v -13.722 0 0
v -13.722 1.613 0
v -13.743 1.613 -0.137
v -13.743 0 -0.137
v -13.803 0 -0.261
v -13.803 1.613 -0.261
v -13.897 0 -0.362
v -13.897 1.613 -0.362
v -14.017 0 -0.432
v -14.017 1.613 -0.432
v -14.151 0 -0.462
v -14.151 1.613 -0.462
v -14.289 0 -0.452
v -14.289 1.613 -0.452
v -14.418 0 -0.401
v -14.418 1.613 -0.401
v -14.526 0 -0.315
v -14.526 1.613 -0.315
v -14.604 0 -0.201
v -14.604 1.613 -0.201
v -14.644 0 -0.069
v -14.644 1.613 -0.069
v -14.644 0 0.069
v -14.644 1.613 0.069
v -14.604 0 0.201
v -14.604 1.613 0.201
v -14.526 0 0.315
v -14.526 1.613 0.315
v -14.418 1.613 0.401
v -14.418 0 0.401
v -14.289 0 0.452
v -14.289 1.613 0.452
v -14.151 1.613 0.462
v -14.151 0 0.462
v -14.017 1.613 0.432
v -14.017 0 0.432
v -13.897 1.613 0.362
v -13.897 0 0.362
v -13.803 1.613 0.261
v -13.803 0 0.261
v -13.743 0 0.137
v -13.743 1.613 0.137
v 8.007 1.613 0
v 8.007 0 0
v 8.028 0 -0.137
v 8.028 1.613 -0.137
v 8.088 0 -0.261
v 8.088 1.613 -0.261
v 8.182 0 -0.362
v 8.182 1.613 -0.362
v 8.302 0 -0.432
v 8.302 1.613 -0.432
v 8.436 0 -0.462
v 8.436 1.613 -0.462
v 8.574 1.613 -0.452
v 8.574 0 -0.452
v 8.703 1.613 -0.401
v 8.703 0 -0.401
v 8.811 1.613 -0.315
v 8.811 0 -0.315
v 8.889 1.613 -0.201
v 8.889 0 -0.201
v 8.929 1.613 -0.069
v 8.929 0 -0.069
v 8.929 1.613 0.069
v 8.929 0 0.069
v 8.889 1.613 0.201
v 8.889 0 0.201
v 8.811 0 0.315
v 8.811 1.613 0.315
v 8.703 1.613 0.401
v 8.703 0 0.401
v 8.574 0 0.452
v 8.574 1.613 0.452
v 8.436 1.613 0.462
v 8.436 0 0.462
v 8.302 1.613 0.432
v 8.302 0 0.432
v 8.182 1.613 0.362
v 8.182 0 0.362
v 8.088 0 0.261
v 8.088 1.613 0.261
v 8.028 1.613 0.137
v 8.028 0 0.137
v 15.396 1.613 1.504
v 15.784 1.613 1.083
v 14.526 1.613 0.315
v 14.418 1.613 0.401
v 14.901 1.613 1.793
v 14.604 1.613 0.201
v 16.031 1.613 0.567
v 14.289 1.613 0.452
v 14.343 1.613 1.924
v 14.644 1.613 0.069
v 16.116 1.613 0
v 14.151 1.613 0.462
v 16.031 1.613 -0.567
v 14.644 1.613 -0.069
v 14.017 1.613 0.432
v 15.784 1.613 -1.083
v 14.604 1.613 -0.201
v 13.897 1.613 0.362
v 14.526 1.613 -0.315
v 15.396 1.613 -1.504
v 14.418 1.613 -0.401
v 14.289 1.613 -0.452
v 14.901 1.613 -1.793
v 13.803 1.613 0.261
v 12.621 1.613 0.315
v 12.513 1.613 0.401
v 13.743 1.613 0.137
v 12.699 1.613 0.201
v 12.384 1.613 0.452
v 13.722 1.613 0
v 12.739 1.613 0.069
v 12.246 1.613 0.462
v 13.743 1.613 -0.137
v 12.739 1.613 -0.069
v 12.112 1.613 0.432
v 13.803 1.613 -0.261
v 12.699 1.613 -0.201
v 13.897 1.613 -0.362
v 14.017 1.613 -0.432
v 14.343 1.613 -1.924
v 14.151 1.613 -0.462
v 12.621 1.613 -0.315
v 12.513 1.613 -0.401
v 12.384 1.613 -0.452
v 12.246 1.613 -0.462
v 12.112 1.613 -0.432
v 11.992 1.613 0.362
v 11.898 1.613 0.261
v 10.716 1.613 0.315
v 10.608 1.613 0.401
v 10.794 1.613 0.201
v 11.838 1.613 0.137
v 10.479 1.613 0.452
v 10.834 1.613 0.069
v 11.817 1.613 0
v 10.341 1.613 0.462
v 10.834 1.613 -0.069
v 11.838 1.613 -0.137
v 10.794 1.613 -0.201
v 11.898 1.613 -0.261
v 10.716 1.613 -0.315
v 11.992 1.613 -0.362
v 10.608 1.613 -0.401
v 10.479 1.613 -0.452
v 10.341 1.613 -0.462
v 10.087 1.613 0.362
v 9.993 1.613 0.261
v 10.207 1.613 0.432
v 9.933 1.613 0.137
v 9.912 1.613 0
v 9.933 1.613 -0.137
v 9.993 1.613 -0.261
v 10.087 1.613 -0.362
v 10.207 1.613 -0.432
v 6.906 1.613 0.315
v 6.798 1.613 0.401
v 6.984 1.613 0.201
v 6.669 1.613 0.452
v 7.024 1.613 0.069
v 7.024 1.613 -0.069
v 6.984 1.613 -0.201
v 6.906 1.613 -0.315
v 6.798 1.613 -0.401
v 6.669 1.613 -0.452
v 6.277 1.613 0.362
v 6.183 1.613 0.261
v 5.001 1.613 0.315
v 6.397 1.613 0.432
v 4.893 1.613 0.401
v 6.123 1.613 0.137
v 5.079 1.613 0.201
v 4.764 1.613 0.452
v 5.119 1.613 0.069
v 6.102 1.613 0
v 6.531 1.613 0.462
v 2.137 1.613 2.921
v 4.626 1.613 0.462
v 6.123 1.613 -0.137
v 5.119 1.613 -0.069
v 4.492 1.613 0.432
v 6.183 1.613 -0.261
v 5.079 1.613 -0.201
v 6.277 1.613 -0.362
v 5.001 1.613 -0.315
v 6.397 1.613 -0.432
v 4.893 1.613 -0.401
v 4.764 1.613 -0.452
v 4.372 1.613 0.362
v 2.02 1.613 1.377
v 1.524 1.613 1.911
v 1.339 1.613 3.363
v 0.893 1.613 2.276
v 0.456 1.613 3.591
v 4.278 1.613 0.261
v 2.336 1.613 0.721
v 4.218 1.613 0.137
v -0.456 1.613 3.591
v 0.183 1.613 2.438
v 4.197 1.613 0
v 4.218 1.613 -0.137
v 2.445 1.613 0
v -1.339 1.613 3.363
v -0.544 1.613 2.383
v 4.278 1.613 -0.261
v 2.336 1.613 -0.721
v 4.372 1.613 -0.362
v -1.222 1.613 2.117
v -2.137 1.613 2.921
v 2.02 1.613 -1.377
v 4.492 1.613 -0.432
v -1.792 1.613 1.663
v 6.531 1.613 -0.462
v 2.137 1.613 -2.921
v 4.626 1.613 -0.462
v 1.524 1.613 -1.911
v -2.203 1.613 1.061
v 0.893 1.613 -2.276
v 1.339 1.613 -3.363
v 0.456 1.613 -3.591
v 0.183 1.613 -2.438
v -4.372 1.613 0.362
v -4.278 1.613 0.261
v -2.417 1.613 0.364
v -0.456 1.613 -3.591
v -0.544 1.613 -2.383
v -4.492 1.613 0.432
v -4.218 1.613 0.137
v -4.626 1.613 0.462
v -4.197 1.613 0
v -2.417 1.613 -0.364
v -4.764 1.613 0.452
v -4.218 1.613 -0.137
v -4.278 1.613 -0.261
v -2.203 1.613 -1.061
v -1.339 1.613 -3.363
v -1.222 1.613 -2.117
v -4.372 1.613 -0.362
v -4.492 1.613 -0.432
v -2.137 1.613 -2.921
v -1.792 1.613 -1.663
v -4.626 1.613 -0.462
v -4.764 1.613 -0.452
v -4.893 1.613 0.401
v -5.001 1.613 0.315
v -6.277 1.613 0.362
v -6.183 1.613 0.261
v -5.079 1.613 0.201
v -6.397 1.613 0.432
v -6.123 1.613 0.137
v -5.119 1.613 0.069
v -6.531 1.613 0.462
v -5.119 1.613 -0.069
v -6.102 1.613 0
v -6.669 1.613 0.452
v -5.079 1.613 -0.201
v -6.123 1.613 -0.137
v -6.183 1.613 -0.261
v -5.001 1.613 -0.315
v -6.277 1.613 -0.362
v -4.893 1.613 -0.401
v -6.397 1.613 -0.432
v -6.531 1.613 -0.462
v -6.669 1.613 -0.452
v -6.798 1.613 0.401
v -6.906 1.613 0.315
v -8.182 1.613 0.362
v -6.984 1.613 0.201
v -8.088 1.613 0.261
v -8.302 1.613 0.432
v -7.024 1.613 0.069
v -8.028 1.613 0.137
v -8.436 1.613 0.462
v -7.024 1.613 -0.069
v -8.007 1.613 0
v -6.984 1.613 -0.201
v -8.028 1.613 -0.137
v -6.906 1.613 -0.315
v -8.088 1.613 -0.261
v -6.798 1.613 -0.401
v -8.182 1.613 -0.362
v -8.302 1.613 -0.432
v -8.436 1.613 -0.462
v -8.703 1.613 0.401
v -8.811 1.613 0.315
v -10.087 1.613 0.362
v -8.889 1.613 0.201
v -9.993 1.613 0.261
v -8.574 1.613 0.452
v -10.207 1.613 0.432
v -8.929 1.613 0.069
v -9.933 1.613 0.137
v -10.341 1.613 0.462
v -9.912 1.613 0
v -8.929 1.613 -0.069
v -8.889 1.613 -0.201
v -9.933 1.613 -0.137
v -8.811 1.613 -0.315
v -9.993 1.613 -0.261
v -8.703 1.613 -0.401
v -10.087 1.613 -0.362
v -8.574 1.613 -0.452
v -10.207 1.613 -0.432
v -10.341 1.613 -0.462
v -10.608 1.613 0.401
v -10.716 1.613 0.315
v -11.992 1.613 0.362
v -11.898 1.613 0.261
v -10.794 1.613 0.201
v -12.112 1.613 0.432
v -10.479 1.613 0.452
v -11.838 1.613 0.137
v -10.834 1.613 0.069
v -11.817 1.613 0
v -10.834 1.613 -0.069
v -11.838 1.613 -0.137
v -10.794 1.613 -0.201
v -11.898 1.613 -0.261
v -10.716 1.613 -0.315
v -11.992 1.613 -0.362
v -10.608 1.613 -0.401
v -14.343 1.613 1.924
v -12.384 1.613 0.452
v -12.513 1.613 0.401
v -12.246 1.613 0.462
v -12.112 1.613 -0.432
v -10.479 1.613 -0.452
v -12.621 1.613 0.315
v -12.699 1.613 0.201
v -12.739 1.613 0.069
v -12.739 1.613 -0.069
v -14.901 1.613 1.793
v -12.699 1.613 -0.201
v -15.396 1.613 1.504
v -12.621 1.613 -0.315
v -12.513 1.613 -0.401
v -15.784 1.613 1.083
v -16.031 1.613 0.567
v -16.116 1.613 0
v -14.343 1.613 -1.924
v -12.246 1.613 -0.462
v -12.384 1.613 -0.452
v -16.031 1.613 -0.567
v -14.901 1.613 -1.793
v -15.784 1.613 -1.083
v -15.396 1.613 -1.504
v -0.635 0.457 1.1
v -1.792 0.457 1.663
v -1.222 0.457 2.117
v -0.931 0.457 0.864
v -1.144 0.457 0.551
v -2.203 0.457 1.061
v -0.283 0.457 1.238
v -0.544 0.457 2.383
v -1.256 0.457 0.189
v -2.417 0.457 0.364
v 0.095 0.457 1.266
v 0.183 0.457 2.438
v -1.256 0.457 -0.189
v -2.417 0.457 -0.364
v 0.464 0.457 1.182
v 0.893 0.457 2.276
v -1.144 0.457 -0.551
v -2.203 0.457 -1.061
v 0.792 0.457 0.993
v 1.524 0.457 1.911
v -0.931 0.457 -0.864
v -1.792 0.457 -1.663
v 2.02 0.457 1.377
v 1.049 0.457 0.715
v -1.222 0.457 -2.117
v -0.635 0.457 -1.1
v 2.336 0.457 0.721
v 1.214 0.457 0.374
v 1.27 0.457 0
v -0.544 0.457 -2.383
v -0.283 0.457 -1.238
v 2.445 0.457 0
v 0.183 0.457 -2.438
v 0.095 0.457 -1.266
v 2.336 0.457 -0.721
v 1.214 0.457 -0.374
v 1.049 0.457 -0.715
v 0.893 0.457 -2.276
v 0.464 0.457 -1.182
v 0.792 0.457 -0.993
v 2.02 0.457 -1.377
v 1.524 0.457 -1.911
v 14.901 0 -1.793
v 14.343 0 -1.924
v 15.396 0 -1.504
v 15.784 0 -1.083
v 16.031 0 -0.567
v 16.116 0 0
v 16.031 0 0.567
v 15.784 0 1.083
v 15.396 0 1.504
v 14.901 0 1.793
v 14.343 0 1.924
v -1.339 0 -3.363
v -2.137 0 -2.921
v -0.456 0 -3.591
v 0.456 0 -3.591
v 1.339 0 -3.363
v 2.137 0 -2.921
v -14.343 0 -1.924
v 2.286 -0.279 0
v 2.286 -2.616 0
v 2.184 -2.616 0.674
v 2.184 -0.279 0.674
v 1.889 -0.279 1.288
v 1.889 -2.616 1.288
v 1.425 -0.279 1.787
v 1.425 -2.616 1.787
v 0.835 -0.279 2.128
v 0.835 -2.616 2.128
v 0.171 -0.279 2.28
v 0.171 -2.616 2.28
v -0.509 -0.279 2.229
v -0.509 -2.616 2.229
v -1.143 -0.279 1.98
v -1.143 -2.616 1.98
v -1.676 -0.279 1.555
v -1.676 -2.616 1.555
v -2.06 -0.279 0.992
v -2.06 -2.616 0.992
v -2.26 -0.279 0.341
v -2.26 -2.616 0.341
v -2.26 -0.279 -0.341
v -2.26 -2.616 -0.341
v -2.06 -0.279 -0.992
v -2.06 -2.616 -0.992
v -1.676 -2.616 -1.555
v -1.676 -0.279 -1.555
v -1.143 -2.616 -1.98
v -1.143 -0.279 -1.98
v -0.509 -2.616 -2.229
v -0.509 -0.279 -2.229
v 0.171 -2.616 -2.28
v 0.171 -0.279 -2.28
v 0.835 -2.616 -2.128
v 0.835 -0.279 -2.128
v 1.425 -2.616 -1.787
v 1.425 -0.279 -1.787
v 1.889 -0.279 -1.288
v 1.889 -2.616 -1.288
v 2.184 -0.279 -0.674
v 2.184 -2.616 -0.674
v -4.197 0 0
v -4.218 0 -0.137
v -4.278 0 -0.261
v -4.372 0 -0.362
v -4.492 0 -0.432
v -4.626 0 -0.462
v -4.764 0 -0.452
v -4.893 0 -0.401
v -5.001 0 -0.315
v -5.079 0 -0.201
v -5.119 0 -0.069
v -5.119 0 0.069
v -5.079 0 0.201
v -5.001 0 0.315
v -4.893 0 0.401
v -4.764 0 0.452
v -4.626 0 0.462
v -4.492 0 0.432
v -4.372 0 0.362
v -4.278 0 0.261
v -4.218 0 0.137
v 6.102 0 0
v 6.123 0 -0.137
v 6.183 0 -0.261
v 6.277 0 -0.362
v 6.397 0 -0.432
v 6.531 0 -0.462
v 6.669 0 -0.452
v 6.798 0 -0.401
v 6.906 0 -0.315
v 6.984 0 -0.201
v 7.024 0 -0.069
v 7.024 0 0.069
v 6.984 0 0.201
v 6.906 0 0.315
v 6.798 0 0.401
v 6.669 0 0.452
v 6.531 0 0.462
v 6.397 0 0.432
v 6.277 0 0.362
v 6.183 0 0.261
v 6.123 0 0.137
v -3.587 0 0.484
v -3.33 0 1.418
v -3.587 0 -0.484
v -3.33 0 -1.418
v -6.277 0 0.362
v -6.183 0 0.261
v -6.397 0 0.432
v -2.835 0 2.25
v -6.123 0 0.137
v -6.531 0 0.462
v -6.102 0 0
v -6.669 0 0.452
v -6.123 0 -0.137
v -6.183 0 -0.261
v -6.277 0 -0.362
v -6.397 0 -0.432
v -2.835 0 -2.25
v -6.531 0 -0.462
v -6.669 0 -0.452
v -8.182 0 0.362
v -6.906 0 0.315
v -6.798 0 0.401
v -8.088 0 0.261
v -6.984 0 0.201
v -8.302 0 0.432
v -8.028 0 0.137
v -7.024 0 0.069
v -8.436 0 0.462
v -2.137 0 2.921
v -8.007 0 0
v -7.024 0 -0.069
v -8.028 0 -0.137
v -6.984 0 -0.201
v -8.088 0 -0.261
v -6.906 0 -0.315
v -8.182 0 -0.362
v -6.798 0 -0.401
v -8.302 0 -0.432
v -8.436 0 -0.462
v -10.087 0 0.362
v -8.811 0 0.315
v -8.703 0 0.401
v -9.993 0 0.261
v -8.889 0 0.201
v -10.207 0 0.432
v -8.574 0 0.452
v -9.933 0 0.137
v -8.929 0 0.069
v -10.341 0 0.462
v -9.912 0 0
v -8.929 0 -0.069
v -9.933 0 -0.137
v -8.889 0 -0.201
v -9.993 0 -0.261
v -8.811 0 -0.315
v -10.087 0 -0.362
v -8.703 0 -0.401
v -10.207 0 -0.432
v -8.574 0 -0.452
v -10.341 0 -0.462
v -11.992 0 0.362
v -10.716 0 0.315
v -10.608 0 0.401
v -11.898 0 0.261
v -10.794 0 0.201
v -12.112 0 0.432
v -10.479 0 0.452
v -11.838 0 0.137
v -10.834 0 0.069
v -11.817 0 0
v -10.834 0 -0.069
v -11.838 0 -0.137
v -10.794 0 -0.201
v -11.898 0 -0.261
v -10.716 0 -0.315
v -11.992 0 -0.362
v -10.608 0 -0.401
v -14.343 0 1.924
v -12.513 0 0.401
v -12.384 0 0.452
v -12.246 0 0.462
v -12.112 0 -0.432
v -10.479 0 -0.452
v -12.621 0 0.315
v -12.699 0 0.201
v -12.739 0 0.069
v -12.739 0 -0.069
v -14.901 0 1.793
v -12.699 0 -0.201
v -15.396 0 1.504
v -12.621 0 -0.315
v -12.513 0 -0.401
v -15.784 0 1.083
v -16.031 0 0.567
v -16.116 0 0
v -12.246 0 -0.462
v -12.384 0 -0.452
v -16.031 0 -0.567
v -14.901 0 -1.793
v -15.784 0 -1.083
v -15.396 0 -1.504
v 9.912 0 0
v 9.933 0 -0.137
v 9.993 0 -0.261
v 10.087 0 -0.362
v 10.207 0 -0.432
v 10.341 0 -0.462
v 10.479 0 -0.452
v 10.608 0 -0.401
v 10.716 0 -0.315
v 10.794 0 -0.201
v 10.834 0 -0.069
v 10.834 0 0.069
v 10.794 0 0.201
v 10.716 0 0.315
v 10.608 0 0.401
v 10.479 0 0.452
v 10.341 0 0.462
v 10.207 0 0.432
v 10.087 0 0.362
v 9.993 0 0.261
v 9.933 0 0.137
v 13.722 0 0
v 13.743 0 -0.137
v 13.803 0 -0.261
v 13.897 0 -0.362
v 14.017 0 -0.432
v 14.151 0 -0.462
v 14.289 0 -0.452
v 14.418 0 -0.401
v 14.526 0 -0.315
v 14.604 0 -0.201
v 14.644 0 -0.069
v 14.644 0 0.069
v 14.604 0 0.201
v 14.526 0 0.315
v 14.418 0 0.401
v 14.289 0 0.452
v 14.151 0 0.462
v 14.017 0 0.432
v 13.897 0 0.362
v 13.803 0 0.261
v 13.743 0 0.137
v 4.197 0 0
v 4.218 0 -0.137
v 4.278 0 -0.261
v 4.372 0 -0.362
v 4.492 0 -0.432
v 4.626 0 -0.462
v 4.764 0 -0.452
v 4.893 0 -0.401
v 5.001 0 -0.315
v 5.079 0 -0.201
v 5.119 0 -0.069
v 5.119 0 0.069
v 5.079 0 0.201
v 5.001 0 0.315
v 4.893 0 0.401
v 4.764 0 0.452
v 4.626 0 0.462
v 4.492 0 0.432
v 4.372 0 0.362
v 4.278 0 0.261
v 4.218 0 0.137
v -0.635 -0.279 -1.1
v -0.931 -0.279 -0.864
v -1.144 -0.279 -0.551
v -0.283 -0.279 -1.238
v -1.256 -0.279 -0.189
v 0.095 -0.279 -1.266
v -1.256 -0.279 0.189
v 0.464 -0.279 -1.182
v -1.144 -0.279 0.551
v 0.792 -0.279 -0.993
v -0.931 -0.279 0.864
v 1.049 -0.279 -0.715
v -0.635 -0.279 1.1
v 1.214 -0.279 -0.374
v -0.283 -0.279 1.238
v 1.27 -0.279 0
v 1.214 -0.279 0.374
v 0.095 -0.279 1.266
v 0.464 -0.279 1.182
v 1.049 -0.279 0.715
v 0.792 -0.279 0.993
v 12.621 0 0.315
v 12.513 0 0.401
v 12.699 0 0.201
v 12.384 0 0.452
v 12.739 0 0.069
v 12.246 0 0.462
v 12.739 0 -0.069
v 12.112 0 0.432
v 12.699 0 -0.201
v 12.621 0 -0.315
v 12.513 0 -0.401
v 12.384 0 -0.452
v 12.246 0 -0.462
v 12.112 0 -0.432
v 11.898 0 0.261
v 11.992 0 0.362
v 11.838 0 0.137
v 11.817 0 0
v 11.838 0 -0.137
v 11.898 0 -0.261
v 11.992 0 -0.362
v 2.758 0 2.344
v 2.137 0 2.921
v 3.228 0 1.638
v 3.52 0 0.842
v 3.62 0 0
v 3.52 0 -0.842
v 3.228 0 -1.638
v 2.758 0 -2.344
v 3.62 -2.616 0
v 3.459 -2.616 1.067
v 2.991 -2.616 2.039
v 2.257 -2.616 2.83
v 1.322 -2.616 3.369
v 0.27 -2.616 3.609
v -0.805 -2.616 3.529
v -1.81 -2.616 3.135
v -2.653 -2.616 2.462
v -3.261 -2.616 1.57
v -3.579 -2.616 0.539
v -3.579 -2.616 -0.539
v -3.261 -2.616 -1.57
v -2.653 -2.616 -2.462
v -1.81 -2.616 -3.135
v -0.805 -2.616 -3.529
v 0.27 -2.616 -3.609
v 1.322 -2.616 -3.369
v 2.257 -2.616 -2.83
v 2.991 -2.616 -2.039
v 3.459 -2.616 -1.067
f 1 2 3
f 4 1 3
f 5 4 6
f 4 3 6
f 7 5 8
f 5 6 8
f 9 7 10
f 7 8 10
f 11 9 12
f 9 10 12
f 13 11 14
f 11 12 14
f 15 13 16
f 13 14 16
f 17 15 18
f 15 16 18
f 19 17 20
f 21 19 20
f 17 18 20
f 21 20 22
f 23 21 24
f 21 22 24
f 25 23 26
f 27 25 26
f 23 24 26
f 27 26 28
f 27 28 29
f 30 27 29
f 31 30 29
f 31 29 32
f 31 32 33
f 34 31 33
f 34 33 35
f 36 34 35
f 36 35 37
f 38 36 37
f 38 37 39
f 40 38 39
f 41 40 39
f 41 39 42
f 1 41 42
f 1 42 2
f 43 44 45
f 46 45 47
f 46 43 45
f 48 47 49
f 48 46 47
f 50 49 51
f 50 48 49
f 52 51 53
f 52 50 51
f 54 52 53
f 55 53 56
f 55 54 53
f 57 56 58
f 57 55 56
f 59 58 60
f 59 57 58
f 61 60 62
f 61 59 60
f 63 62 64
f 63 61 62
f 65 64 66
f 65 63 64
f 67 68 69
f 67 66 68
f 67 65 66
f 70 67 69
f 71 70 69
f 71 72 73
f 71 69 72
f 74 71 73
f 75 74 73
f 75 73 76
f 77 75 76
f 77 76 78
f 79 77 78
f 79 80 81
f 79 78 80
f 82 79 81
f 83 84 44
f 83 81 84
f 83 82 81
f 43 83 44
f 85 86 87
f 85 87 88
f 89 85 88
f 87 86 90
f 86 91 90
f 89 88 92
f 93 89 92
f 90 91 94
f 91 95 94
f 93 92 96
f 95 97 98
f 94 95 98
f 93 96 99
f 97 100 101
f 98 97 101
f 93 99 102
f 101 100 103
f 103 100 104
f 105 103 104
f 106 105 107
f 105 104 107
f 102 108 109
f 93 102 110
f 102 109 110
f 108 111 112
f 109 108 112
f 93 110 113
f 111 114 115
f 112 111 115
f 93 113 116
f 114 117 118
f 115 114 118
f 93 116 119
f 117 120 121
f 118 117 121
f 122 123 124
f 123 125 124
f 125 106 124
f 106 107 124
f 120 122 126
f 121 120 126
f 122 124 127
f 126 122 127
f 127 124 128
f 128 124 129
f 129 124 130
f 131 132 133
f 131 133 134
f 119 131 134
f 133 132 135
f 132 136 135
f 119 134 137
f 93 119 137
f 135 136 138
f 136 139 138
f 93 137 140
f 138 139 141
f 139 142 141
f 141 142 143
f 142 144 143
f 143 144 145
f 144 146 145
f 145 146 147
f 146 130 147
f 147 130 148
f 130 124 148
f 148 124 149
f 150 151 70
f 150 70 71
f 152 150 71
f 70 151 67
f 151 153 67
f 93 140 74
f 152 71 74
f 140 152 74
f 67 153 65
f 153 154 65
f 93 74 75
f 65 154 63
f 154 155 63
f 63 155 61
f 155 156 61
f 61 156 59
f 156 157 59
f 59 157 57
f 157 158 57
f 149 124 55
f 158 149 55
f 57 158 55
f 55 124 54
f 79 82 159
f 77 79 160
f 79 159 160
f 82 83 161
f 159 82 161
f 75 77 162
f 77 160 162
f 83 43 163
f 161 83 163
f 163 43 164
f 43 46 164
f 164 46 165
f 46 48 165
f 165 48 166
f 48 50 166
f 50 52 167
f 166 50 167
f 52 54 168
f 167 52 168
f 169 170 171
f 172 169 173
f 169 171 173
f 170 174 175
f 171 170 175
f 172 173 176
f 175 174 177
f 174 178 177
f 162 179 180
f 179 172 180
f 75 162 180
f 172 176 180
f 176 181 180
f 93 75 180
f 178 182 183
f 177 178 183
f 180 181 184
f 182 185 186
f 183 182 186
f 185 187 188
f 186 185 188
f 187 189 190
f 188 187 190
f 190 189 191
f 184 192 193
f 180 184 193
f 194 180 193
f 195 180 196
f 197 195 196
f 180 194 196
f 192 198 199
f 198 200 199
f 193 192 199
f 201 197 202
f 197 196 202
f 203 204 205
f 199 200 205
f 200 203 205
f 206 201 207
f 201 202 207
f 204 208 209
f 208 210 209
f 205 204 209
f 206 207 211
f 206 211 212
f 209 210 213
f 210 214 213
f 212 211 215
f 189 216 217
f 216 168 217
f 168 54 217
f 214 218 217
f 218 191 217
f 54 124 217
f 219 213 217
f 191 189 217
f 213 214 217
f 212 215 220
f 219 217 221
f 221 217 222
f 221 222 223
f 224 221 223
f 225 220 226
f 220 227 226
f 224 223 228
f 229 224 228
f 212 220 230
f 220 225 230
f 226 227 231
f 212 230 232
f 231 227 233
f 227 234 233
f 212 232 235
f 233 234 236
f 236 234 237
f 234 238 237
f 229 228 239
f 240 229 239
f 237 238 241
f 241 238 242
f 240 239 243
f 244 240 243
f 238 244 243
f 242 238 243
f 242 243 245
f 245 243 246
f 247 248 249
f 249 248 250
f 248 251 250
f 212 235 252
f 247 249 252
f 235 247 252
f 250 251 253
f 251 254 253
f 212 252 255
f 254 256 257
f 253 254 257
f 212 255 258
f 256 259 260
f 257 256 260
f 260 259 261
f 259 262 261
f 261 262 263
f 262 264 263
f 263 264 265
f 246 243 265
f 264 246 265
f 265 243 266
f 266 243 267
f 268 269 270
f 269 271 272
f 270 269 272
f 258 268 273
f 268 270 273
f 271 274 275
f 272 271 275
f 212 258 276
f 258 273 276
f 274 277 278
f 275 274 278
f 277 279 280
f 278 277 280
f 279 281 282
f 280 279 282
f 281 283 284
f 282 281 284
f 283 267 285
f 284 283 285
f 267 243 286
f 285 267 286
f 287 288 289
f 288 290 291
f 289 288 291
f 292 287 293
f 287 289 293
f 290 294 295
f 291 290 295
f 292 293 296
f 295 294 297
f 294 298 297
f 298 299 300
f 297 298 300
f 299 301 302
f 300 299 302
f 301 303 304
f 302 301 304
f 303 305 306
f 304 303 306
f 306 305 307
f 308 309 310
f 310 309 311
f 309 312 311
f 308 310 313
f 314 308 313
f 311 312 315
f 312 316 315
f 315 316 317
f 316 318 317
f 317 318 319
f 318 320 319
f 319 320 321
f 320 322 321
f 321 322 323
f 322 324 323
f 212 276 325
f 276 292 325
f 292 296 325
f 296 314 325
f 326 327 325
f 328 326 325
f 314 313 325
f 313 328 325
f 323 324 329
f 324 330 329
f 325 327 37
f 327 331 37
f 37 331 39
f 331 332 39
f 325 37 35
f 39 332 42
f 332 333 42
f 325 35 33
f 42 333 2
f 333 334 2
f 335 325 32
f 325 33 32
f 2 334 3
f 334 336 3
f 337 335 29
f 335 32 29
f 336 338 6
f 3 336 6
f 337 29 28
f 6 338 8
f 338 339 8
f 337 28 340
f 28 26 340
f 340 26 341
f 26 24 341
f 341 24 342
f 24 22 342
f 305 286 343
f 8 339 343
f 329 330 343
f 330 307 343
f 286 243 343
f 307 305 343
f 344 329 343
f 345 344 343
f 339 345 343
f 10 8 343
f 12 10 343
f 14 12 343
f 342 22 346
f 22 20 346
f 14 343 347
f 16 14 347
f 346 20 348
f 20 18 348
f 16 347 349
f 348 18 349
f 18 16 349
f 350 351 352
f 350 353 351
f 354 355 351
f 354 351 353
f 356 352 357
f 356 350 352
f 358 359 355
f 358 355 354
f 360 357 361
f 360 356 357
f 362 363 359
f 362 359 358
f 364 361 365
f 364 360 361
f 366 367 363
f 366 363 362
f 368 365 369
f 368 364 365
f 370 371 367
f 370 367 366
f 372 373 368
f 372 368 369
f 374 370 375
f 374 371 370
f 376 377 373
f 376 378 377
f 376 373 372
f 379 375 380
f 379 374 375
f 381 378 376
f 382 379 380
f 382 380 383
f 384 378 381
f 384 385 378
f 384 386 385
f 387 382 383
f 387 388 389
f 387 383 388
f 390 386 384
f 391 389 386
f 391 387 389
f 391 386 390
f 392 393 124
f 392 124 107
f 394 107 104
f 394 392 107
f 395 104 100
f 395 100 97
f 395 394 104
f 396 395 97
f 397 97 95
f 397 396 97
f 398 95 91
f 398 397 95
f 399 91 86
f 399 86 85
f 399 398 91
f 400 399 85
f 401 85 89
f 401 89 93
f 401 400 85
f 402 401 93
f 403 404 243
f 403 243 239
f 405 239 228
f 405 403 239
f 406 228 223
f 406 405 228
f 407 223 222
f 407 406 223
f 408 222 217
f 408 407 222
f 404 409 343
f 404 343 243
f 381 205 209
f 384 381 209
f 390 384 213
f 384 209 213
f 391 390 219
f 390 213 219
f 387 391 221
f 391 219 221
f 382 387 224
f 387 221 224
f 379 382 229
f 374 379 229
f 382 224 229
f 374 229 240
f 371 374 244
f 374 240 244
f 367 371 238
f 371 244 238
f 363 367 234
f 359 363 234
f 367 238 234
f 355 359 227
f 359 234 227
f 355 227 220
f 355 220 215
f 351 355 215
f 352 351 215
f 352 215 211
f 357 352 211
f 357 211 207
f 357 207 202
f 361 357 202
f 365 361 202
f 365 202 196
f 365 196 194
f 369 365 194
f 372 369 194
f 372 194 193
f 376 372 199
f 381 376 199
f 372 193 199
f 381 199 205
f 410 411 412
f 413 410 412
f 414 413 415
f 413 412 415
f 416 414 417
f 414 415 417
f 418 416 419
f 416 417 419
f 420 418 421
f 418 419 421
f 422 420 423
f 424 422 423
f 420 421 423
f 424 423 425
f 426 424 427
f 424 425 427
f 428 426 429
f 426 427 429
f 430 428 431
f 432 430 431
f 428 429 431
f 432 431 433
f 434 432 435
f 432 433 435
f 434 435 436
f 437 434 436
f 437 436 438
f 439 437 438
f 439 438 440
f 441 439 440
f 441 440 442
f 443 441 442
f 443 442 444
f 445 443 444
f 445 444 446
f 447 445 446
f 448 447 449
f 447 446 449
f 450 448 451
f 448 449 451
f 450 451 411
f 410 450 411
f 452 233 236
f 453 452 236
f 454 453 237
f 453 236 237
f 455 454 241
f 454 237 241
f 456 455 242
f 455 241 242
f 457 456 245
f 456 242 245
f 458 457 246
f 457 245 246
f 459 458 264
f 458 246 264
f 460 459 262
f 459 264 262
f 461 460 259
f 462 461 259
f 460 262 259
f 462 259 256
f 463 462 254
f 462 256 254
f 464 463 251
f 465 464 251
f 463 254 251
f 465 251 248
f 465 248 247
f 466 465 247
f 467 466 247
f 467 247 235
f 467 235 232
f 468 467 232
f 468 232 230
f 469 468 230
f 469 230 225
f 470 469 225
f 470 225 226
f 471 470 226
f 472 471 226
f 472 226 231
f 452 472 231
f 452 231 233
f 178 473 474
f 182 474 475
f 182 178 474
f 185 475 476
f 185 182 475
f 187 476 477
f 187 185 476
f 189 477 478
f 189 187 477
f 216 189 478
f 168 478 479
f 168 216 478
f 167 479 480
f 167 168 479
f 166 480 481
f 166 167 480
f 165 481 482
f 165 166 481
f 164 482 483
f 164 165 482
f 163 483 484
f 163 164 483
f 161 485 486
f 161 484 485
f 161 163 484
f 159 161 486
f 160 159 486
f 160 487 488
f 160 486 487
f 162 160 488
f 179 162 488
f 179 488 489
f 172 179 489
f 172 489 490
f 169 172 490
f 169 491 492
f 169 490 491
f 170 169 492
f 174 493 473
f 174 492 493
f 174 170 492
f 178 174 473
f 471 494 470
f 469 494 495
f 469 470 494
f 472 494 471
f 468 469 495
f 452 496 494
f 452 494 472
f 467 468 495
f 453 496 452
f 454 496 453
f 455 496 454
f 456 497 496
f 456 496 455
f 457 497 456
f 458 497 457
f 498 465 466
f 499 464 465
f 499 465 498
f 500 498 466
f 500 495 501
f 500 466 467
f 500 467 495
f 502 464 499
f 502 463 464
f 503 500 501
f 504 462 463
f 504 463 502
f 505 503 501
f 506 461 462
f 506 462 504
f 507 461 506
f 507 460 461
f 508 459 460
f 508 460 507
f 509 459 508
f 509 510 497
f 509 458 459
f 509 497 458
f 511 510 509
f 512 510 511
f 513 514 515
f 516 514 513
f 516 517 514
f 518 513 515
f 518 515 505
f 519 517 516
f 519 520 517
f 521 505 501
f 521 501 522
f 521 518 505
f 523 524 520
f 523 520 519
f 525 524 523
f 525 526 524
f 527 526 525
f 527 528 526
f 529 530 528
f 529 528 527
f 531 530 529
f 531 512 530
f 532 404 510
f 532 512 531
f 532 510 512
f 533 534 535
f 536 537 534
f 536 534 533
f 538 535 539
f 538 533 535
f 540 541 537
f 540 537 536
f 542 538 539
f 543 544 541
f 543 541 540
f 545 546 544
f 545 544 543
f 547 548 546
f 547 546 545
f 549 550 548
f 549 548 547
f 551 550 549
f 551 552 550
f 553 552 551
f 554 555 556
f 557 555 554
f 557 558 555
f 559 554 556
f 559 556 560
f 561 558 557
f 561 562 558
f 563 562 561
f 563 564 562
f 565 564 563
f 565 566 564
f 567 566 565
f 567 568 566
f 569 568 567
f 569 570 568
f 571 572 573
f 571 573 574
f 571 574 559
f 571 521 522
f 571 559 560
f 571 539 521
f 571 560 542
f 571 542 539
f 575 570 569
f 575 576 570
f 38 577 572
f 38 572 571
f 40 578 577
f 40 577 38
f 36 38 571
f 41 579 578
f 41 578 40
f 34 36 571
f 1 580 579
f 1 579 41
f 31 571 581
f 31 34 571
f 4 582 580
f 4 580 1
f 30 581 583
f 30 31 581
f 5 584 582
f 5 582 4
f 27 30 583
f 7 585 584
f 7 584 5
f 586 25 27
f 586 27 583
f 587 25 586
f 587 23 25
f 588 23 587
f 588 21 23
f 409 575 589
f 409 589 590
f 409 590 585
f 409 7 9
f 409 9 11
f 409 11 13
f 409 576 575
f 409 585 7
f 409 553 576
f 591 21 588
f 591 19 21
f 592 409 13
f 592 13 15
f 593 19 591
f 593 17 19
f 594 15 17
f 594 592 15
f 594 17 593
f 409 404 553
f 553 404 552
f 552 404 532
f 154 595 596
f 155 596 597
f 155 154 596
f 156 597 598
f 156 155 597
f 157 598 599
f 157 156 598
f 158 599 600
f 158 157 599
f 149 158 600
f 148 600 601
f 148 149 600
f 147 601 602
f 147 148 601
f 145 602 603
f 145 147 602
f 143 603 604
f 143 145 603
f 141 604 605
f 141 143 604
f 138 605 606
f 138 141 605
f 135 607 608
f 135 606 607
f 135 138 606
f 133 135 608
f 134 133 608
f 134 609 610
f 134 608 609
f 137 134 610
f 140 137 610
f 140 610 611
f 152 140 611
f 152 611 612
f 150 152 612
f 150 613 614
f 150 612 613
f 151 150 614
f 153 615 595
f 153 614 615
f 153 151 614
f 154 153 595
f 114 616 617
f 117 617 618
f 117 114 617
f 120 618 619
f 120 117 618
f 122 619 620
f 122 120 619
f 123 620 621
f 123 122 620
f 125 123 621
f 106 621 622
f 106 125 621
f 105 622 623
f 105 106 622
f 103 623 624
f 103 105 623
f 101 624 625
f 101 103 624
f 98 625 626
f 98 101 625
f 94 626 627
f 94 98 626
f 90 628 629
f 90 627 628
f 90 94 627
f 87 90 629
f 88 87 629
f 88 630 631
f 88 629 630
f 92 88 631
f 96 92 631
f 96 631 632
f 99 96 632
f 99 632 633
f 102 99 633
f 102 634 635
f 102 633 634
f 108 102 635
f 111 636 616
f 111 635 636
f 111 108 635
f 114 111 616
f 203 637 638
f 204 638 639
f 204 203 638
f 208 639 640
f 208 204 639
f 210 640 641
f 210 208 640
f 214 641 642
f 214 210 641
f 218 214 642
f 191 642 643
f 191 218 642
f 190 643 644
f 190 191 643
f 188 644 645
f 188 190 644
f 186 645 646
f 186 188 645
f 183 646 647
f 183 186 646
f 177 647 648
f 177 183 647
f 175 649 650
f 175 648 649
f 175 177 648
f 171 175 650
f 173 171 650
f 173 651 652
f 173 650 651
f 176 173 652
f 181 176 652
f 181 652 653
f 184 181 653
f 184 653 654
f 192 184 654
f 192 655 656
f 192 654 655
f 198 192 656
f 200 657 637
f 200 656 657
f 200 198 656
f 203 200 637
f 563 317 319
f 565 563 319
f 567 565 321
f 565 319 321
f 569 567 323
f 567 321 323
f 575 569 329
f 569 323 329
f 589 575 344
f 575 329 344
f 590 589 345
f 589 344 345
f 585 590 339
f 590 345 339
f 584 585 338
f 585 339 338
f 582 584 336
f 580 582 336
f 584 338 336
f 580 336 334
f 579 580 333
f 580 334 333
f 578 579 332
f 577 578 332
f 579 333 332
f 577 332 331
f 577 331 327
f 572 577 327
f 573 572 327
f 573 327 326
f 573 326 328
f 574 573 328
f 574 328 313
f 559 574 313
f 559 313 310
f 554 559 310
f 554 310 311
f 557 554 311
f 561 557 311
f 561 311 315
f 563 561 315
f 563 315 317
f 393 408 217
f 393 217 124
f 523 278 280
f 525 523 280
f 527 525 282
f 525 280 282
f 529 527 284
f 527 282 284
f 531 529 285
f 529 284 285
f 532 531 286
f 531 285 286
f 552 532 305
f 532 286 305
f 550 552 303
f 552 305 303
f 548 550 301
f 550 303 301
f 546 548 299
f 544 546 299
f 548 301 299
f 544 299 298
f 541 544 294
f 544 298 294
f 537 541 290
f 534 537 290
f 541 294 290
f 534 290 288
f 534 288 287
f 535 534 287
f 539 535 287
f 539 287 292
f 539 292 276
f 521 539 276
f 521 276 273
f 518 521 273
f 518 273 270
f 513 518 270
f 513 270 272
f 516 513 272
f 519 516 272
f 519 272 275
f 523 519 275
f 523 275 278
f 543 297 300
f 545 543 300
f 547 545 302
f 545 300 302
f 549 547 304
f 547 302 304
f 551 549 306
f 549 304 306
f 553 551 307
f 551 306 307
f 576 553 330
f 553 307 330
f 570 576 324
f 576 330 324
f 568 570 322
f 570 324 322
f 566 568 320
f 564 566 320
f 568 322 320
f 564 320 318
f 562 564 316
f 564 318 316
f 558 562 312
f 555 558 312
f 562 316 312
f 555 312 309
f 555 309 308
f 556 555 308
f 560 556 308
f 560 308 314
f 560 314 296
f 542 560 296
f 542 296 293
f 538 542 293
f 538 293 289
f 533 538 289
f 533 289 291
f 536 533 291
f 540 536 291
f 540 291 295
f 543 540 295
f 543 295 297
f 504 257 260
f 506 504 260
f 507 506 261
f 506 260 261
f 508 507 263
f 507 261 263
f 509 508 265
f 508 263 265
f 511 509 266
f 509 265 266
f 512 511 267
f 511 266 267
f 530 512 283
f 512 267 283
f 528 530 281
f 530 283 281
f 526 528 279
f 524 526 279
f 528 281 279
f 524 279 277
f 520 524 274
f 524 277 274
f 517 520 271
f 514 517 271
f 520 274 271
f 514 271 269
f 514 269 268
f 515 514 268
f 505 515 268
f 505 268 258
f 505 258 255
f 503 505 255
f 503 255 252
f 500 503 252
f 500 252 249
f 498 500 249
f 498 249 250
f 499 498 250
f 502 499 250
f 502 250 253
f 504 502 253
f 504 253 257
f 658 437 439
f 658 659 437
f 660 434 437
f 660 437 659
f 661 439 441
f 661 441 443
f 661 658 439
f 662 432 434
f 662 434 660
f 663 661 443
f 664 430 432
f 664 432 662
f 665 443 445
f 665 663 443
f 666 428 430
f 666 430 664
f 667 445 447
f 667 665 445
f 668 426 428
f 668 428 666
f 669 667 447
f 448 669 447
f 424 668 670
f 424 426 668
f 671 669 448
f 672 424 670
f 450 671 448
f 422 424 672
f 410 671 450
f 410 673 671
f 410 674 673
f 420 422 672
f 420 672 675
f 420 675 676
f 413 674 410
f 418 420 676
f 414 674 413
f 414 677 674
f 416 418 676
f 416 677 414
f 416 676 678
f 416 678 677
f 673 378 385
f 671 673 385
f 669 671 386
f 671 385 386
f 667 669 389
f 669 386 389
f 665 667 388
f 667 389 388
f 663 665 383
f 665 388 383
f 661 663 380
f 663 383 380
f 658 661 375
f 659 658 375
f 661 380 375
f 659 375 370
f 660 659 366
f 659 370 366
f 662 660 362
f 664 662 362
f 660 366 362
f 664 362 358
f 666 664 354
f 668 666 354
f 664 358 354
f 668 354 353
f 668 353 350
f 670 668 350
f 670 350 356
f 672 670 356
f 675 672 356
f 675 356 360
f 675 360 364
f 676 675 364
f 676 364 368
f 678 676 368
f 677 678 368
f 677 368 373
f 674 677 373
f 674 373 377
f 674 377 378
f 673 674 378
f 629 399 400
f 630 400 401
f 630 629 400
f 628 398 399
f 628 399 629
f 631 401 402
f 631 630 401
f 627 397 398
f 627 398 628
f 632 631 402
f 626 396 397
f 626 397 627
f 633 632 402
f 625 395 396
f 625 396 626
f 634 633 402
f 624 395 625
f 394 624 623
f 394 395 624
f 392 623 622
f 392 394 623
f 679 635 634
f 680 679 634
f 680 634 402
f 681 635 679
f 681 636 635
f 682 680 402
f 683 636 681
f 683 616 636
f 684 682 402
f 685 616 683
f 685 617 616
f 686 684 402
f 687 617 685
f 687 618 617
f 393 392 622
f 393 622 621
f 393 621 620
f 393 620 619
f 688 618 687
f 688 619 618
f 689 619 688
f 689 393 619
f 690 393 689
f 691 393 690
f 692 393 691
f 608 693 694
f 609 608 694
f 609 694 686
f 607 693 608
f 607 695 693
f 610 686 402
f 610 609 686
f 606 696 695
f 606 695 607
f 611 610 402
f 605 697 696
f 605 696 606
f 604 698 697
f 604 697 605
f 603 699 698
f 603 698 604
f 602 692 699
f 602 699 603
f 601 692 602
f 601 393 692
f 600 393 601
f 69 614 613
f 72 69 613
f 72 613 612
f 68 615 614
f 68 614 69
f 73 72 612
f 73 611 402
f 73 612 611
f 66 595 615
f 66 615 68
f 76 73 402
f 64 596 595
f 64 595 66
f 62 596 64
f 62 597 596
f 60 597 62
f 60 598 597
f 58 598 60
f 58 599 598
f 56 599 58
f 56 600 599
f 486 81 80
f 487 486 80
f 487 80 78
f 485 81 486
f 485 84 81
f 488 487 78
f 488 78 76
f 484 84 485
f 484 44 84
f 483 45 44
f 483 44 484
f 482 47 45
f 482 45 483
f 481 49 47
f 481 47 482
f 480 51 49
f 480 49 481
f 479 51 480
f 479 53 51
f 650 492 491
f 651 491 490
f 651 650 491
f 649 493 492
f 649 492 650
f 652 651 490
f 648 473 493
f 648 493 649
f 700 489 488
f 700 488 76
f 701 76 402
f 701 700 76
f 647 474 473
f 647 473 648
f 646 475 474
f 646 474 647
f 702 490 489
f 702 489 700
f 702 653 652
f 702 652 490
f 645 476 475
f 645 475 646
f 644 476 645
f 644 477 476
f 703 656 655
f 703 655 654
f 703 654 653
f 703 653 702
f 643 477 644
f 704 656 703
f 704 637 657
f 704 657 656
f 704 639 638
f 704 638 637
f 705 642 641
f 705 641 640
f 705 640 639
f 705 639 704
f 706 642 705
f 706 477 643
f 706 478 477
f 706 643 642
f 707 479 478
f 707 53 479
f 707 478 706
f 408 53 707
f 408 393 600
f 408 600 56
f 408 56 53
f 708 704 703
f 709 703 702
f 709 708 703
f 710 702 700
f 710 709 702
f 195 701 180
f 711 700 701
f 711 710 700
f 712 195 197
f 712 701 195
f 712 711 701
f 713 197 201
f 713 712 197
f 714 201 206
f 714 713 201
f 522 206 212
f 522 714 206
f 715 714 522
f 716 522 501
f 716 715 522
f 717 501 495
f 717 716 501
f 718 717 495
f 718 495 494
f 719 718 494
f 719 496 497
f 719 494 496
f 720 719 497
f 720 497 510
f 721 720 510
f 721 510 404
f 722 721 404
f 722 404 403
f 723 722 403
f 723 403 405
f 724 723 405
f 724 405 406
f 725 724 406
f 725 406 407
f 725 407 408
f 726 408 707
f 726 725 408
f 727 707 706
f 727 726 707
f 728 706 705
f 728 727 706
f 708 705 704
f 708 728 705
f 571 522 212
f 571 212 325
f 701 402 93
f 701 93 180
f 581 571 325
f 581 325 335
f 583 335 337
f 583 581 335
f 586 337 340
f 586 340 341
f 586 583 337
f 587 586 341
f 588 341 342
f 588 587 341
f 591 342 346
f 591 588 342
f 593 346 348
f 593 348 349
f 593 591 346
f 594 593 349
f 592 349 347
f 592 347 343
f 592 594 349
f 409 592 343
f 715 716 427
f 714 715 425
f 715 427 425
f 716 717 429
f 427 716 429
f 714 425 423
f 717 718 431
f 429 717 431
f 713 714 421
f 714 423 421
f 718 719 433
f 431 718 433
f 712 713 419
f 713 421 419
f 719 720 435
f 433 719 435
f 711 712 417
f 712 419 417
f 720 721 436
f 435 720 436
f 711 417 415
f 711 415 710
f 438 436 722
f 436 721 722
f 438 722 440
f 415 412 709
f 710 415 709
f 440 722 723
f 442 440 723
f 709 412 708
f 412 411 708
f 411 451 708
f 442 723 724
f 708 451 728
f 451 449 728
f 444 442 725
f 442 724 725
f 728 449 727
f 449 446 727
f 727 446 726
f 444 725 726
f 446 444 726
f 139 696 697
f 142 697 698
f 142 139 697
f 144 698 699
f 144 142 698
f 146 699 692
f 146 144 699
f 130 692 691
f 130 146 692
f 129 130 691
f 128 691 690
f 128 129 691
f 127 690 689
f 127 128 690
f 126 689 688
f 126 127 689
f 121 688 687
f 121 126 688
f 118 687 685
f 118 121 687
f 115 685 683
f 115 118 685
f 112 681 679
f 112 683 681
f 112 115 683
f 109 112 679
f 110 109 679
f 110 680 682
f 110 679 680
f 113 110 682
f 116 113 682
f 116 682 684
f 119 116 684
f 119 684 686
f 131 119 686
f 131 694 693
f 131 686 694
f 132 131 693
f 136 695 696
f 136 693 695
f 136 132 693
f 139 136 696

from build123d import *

# Parameters (mm, degrees)
EXTRUDE17_DEPTH = 1.6129
SKETCH19_R      = 3.6195
EXTRUDE19_DEPTH = 4.2291
SKETCH20_R      = 0.46355
SKETCH20_R_2    = 1.27
EXTRUDE20_DEPTH = 5.2291
SKETCH21_R      = 2.44475
EXTRUDE21_DEPTH = 1.1557
SKETCH22_R      = 2.286
EXTRUDE22_DEPTH = 2.3368


with BuildPart() as part:
    # Sketch18 → Extrude17 (new body)
    with BuildSketch(Plane(origin=(0, 0, 0), x_dir=(1, 0, 0), z_dir=(0, 1, 0))):
        with BuildLine():
            Line((-14.34305969, 1.923991942), (-2.13741415, 2.921))
            ThreePointArc((-2.13741415, 2.921), (0, 3.6195), (2.13741415, 2.921))
            Line((2.13741415, 2.921), (14.34305969, 1.923991942))
            ThreePointArc((14.34305969, 1.923991942), (16.1163, 0), (14.34305969, -1.923991942))
            Line((14.34305969, -1.923991942), (2.13741415, -2.921))
            ThreePointArc((2.13741415, -2.921), (0, -3.6195), (-2.13741415, -2.921))
            Line((-2.13741415, -2.921), (-14.34305969, -1.923991942))
            ThreePointArc((-14.34305969, -1.923991942), (-16.1163, 0), (-14.34305969, 1.923991942))
        make_face()
    extrude(amount=EXTRUDE17_DEPTH)

    # Sketch19 → Extrude19 (add)
    with BuildSketch(Plane(origin=(0, 1.6129, 0), x_dir=(1, 0, 0), z_dir=(0, 1, 0))):
        Circle(SKETCH19_R)
    extrude(amount=-EXTRUDE19_DEPTH)

    # Sketch20 → Extrude20 (cut, through all)
    with BuildSketch(Plane(origin=(0, 1.6129, 0), x_dir=(1, 0, 0), z_dir=(0, 1, 0))):
        with Locations((-14.1859, 0)):
            Circle(SKETCH20_R)
        Circle(SKETCH20_R_2)
        with Locations((-4.6609, 0)):
            Circle(SKETCH20_R)
        with Locations((-6.5659, 0)):
            Circle(SKETCH20_R)
        with Locations((-8.4709, 0)):
            Circle(SKETCH20_R)
        with Locations((-10.3759, 0)):
            Circle(SKETCH20_R)
        with Locations((-12.2809, 0)):
            Circle(SKETCH20_R)
    extrude20 = extrude(amount=-EXTRUDE20_DEPTH, mode=Mode.SUBTRACT)

    # Mirror1: Extrude20 across plane
    add(extrude20.mirror(Plane(origin=(0, 0, 0), x_dir=(0, 0, 1), z_dir=(1, 0, 0))), mode=Mode.SUBTRACT)

    # Sketch21 → Extrude21 (cut)
    with BuildSketch(Plane(origin=(0, 1.6129, 0), x_dir=(1, 0, 0), z_dir=(0, 1, 0))):
        Circle(SKETCH21_R)
    extrude(amount=-EXTRUDE21_DEPTH, mode=Mode.SUBTRACT)

    # Sketch22 → Extrude22 (cut)
    with BuildSketch(Plane.XZ.offset(2.6162)):
        Circle(SKETCH22_R)
    extrude(amount=-EXTRUDE22_DEPTH, mode=Mode.SUBTRACT)


solid = part.part
